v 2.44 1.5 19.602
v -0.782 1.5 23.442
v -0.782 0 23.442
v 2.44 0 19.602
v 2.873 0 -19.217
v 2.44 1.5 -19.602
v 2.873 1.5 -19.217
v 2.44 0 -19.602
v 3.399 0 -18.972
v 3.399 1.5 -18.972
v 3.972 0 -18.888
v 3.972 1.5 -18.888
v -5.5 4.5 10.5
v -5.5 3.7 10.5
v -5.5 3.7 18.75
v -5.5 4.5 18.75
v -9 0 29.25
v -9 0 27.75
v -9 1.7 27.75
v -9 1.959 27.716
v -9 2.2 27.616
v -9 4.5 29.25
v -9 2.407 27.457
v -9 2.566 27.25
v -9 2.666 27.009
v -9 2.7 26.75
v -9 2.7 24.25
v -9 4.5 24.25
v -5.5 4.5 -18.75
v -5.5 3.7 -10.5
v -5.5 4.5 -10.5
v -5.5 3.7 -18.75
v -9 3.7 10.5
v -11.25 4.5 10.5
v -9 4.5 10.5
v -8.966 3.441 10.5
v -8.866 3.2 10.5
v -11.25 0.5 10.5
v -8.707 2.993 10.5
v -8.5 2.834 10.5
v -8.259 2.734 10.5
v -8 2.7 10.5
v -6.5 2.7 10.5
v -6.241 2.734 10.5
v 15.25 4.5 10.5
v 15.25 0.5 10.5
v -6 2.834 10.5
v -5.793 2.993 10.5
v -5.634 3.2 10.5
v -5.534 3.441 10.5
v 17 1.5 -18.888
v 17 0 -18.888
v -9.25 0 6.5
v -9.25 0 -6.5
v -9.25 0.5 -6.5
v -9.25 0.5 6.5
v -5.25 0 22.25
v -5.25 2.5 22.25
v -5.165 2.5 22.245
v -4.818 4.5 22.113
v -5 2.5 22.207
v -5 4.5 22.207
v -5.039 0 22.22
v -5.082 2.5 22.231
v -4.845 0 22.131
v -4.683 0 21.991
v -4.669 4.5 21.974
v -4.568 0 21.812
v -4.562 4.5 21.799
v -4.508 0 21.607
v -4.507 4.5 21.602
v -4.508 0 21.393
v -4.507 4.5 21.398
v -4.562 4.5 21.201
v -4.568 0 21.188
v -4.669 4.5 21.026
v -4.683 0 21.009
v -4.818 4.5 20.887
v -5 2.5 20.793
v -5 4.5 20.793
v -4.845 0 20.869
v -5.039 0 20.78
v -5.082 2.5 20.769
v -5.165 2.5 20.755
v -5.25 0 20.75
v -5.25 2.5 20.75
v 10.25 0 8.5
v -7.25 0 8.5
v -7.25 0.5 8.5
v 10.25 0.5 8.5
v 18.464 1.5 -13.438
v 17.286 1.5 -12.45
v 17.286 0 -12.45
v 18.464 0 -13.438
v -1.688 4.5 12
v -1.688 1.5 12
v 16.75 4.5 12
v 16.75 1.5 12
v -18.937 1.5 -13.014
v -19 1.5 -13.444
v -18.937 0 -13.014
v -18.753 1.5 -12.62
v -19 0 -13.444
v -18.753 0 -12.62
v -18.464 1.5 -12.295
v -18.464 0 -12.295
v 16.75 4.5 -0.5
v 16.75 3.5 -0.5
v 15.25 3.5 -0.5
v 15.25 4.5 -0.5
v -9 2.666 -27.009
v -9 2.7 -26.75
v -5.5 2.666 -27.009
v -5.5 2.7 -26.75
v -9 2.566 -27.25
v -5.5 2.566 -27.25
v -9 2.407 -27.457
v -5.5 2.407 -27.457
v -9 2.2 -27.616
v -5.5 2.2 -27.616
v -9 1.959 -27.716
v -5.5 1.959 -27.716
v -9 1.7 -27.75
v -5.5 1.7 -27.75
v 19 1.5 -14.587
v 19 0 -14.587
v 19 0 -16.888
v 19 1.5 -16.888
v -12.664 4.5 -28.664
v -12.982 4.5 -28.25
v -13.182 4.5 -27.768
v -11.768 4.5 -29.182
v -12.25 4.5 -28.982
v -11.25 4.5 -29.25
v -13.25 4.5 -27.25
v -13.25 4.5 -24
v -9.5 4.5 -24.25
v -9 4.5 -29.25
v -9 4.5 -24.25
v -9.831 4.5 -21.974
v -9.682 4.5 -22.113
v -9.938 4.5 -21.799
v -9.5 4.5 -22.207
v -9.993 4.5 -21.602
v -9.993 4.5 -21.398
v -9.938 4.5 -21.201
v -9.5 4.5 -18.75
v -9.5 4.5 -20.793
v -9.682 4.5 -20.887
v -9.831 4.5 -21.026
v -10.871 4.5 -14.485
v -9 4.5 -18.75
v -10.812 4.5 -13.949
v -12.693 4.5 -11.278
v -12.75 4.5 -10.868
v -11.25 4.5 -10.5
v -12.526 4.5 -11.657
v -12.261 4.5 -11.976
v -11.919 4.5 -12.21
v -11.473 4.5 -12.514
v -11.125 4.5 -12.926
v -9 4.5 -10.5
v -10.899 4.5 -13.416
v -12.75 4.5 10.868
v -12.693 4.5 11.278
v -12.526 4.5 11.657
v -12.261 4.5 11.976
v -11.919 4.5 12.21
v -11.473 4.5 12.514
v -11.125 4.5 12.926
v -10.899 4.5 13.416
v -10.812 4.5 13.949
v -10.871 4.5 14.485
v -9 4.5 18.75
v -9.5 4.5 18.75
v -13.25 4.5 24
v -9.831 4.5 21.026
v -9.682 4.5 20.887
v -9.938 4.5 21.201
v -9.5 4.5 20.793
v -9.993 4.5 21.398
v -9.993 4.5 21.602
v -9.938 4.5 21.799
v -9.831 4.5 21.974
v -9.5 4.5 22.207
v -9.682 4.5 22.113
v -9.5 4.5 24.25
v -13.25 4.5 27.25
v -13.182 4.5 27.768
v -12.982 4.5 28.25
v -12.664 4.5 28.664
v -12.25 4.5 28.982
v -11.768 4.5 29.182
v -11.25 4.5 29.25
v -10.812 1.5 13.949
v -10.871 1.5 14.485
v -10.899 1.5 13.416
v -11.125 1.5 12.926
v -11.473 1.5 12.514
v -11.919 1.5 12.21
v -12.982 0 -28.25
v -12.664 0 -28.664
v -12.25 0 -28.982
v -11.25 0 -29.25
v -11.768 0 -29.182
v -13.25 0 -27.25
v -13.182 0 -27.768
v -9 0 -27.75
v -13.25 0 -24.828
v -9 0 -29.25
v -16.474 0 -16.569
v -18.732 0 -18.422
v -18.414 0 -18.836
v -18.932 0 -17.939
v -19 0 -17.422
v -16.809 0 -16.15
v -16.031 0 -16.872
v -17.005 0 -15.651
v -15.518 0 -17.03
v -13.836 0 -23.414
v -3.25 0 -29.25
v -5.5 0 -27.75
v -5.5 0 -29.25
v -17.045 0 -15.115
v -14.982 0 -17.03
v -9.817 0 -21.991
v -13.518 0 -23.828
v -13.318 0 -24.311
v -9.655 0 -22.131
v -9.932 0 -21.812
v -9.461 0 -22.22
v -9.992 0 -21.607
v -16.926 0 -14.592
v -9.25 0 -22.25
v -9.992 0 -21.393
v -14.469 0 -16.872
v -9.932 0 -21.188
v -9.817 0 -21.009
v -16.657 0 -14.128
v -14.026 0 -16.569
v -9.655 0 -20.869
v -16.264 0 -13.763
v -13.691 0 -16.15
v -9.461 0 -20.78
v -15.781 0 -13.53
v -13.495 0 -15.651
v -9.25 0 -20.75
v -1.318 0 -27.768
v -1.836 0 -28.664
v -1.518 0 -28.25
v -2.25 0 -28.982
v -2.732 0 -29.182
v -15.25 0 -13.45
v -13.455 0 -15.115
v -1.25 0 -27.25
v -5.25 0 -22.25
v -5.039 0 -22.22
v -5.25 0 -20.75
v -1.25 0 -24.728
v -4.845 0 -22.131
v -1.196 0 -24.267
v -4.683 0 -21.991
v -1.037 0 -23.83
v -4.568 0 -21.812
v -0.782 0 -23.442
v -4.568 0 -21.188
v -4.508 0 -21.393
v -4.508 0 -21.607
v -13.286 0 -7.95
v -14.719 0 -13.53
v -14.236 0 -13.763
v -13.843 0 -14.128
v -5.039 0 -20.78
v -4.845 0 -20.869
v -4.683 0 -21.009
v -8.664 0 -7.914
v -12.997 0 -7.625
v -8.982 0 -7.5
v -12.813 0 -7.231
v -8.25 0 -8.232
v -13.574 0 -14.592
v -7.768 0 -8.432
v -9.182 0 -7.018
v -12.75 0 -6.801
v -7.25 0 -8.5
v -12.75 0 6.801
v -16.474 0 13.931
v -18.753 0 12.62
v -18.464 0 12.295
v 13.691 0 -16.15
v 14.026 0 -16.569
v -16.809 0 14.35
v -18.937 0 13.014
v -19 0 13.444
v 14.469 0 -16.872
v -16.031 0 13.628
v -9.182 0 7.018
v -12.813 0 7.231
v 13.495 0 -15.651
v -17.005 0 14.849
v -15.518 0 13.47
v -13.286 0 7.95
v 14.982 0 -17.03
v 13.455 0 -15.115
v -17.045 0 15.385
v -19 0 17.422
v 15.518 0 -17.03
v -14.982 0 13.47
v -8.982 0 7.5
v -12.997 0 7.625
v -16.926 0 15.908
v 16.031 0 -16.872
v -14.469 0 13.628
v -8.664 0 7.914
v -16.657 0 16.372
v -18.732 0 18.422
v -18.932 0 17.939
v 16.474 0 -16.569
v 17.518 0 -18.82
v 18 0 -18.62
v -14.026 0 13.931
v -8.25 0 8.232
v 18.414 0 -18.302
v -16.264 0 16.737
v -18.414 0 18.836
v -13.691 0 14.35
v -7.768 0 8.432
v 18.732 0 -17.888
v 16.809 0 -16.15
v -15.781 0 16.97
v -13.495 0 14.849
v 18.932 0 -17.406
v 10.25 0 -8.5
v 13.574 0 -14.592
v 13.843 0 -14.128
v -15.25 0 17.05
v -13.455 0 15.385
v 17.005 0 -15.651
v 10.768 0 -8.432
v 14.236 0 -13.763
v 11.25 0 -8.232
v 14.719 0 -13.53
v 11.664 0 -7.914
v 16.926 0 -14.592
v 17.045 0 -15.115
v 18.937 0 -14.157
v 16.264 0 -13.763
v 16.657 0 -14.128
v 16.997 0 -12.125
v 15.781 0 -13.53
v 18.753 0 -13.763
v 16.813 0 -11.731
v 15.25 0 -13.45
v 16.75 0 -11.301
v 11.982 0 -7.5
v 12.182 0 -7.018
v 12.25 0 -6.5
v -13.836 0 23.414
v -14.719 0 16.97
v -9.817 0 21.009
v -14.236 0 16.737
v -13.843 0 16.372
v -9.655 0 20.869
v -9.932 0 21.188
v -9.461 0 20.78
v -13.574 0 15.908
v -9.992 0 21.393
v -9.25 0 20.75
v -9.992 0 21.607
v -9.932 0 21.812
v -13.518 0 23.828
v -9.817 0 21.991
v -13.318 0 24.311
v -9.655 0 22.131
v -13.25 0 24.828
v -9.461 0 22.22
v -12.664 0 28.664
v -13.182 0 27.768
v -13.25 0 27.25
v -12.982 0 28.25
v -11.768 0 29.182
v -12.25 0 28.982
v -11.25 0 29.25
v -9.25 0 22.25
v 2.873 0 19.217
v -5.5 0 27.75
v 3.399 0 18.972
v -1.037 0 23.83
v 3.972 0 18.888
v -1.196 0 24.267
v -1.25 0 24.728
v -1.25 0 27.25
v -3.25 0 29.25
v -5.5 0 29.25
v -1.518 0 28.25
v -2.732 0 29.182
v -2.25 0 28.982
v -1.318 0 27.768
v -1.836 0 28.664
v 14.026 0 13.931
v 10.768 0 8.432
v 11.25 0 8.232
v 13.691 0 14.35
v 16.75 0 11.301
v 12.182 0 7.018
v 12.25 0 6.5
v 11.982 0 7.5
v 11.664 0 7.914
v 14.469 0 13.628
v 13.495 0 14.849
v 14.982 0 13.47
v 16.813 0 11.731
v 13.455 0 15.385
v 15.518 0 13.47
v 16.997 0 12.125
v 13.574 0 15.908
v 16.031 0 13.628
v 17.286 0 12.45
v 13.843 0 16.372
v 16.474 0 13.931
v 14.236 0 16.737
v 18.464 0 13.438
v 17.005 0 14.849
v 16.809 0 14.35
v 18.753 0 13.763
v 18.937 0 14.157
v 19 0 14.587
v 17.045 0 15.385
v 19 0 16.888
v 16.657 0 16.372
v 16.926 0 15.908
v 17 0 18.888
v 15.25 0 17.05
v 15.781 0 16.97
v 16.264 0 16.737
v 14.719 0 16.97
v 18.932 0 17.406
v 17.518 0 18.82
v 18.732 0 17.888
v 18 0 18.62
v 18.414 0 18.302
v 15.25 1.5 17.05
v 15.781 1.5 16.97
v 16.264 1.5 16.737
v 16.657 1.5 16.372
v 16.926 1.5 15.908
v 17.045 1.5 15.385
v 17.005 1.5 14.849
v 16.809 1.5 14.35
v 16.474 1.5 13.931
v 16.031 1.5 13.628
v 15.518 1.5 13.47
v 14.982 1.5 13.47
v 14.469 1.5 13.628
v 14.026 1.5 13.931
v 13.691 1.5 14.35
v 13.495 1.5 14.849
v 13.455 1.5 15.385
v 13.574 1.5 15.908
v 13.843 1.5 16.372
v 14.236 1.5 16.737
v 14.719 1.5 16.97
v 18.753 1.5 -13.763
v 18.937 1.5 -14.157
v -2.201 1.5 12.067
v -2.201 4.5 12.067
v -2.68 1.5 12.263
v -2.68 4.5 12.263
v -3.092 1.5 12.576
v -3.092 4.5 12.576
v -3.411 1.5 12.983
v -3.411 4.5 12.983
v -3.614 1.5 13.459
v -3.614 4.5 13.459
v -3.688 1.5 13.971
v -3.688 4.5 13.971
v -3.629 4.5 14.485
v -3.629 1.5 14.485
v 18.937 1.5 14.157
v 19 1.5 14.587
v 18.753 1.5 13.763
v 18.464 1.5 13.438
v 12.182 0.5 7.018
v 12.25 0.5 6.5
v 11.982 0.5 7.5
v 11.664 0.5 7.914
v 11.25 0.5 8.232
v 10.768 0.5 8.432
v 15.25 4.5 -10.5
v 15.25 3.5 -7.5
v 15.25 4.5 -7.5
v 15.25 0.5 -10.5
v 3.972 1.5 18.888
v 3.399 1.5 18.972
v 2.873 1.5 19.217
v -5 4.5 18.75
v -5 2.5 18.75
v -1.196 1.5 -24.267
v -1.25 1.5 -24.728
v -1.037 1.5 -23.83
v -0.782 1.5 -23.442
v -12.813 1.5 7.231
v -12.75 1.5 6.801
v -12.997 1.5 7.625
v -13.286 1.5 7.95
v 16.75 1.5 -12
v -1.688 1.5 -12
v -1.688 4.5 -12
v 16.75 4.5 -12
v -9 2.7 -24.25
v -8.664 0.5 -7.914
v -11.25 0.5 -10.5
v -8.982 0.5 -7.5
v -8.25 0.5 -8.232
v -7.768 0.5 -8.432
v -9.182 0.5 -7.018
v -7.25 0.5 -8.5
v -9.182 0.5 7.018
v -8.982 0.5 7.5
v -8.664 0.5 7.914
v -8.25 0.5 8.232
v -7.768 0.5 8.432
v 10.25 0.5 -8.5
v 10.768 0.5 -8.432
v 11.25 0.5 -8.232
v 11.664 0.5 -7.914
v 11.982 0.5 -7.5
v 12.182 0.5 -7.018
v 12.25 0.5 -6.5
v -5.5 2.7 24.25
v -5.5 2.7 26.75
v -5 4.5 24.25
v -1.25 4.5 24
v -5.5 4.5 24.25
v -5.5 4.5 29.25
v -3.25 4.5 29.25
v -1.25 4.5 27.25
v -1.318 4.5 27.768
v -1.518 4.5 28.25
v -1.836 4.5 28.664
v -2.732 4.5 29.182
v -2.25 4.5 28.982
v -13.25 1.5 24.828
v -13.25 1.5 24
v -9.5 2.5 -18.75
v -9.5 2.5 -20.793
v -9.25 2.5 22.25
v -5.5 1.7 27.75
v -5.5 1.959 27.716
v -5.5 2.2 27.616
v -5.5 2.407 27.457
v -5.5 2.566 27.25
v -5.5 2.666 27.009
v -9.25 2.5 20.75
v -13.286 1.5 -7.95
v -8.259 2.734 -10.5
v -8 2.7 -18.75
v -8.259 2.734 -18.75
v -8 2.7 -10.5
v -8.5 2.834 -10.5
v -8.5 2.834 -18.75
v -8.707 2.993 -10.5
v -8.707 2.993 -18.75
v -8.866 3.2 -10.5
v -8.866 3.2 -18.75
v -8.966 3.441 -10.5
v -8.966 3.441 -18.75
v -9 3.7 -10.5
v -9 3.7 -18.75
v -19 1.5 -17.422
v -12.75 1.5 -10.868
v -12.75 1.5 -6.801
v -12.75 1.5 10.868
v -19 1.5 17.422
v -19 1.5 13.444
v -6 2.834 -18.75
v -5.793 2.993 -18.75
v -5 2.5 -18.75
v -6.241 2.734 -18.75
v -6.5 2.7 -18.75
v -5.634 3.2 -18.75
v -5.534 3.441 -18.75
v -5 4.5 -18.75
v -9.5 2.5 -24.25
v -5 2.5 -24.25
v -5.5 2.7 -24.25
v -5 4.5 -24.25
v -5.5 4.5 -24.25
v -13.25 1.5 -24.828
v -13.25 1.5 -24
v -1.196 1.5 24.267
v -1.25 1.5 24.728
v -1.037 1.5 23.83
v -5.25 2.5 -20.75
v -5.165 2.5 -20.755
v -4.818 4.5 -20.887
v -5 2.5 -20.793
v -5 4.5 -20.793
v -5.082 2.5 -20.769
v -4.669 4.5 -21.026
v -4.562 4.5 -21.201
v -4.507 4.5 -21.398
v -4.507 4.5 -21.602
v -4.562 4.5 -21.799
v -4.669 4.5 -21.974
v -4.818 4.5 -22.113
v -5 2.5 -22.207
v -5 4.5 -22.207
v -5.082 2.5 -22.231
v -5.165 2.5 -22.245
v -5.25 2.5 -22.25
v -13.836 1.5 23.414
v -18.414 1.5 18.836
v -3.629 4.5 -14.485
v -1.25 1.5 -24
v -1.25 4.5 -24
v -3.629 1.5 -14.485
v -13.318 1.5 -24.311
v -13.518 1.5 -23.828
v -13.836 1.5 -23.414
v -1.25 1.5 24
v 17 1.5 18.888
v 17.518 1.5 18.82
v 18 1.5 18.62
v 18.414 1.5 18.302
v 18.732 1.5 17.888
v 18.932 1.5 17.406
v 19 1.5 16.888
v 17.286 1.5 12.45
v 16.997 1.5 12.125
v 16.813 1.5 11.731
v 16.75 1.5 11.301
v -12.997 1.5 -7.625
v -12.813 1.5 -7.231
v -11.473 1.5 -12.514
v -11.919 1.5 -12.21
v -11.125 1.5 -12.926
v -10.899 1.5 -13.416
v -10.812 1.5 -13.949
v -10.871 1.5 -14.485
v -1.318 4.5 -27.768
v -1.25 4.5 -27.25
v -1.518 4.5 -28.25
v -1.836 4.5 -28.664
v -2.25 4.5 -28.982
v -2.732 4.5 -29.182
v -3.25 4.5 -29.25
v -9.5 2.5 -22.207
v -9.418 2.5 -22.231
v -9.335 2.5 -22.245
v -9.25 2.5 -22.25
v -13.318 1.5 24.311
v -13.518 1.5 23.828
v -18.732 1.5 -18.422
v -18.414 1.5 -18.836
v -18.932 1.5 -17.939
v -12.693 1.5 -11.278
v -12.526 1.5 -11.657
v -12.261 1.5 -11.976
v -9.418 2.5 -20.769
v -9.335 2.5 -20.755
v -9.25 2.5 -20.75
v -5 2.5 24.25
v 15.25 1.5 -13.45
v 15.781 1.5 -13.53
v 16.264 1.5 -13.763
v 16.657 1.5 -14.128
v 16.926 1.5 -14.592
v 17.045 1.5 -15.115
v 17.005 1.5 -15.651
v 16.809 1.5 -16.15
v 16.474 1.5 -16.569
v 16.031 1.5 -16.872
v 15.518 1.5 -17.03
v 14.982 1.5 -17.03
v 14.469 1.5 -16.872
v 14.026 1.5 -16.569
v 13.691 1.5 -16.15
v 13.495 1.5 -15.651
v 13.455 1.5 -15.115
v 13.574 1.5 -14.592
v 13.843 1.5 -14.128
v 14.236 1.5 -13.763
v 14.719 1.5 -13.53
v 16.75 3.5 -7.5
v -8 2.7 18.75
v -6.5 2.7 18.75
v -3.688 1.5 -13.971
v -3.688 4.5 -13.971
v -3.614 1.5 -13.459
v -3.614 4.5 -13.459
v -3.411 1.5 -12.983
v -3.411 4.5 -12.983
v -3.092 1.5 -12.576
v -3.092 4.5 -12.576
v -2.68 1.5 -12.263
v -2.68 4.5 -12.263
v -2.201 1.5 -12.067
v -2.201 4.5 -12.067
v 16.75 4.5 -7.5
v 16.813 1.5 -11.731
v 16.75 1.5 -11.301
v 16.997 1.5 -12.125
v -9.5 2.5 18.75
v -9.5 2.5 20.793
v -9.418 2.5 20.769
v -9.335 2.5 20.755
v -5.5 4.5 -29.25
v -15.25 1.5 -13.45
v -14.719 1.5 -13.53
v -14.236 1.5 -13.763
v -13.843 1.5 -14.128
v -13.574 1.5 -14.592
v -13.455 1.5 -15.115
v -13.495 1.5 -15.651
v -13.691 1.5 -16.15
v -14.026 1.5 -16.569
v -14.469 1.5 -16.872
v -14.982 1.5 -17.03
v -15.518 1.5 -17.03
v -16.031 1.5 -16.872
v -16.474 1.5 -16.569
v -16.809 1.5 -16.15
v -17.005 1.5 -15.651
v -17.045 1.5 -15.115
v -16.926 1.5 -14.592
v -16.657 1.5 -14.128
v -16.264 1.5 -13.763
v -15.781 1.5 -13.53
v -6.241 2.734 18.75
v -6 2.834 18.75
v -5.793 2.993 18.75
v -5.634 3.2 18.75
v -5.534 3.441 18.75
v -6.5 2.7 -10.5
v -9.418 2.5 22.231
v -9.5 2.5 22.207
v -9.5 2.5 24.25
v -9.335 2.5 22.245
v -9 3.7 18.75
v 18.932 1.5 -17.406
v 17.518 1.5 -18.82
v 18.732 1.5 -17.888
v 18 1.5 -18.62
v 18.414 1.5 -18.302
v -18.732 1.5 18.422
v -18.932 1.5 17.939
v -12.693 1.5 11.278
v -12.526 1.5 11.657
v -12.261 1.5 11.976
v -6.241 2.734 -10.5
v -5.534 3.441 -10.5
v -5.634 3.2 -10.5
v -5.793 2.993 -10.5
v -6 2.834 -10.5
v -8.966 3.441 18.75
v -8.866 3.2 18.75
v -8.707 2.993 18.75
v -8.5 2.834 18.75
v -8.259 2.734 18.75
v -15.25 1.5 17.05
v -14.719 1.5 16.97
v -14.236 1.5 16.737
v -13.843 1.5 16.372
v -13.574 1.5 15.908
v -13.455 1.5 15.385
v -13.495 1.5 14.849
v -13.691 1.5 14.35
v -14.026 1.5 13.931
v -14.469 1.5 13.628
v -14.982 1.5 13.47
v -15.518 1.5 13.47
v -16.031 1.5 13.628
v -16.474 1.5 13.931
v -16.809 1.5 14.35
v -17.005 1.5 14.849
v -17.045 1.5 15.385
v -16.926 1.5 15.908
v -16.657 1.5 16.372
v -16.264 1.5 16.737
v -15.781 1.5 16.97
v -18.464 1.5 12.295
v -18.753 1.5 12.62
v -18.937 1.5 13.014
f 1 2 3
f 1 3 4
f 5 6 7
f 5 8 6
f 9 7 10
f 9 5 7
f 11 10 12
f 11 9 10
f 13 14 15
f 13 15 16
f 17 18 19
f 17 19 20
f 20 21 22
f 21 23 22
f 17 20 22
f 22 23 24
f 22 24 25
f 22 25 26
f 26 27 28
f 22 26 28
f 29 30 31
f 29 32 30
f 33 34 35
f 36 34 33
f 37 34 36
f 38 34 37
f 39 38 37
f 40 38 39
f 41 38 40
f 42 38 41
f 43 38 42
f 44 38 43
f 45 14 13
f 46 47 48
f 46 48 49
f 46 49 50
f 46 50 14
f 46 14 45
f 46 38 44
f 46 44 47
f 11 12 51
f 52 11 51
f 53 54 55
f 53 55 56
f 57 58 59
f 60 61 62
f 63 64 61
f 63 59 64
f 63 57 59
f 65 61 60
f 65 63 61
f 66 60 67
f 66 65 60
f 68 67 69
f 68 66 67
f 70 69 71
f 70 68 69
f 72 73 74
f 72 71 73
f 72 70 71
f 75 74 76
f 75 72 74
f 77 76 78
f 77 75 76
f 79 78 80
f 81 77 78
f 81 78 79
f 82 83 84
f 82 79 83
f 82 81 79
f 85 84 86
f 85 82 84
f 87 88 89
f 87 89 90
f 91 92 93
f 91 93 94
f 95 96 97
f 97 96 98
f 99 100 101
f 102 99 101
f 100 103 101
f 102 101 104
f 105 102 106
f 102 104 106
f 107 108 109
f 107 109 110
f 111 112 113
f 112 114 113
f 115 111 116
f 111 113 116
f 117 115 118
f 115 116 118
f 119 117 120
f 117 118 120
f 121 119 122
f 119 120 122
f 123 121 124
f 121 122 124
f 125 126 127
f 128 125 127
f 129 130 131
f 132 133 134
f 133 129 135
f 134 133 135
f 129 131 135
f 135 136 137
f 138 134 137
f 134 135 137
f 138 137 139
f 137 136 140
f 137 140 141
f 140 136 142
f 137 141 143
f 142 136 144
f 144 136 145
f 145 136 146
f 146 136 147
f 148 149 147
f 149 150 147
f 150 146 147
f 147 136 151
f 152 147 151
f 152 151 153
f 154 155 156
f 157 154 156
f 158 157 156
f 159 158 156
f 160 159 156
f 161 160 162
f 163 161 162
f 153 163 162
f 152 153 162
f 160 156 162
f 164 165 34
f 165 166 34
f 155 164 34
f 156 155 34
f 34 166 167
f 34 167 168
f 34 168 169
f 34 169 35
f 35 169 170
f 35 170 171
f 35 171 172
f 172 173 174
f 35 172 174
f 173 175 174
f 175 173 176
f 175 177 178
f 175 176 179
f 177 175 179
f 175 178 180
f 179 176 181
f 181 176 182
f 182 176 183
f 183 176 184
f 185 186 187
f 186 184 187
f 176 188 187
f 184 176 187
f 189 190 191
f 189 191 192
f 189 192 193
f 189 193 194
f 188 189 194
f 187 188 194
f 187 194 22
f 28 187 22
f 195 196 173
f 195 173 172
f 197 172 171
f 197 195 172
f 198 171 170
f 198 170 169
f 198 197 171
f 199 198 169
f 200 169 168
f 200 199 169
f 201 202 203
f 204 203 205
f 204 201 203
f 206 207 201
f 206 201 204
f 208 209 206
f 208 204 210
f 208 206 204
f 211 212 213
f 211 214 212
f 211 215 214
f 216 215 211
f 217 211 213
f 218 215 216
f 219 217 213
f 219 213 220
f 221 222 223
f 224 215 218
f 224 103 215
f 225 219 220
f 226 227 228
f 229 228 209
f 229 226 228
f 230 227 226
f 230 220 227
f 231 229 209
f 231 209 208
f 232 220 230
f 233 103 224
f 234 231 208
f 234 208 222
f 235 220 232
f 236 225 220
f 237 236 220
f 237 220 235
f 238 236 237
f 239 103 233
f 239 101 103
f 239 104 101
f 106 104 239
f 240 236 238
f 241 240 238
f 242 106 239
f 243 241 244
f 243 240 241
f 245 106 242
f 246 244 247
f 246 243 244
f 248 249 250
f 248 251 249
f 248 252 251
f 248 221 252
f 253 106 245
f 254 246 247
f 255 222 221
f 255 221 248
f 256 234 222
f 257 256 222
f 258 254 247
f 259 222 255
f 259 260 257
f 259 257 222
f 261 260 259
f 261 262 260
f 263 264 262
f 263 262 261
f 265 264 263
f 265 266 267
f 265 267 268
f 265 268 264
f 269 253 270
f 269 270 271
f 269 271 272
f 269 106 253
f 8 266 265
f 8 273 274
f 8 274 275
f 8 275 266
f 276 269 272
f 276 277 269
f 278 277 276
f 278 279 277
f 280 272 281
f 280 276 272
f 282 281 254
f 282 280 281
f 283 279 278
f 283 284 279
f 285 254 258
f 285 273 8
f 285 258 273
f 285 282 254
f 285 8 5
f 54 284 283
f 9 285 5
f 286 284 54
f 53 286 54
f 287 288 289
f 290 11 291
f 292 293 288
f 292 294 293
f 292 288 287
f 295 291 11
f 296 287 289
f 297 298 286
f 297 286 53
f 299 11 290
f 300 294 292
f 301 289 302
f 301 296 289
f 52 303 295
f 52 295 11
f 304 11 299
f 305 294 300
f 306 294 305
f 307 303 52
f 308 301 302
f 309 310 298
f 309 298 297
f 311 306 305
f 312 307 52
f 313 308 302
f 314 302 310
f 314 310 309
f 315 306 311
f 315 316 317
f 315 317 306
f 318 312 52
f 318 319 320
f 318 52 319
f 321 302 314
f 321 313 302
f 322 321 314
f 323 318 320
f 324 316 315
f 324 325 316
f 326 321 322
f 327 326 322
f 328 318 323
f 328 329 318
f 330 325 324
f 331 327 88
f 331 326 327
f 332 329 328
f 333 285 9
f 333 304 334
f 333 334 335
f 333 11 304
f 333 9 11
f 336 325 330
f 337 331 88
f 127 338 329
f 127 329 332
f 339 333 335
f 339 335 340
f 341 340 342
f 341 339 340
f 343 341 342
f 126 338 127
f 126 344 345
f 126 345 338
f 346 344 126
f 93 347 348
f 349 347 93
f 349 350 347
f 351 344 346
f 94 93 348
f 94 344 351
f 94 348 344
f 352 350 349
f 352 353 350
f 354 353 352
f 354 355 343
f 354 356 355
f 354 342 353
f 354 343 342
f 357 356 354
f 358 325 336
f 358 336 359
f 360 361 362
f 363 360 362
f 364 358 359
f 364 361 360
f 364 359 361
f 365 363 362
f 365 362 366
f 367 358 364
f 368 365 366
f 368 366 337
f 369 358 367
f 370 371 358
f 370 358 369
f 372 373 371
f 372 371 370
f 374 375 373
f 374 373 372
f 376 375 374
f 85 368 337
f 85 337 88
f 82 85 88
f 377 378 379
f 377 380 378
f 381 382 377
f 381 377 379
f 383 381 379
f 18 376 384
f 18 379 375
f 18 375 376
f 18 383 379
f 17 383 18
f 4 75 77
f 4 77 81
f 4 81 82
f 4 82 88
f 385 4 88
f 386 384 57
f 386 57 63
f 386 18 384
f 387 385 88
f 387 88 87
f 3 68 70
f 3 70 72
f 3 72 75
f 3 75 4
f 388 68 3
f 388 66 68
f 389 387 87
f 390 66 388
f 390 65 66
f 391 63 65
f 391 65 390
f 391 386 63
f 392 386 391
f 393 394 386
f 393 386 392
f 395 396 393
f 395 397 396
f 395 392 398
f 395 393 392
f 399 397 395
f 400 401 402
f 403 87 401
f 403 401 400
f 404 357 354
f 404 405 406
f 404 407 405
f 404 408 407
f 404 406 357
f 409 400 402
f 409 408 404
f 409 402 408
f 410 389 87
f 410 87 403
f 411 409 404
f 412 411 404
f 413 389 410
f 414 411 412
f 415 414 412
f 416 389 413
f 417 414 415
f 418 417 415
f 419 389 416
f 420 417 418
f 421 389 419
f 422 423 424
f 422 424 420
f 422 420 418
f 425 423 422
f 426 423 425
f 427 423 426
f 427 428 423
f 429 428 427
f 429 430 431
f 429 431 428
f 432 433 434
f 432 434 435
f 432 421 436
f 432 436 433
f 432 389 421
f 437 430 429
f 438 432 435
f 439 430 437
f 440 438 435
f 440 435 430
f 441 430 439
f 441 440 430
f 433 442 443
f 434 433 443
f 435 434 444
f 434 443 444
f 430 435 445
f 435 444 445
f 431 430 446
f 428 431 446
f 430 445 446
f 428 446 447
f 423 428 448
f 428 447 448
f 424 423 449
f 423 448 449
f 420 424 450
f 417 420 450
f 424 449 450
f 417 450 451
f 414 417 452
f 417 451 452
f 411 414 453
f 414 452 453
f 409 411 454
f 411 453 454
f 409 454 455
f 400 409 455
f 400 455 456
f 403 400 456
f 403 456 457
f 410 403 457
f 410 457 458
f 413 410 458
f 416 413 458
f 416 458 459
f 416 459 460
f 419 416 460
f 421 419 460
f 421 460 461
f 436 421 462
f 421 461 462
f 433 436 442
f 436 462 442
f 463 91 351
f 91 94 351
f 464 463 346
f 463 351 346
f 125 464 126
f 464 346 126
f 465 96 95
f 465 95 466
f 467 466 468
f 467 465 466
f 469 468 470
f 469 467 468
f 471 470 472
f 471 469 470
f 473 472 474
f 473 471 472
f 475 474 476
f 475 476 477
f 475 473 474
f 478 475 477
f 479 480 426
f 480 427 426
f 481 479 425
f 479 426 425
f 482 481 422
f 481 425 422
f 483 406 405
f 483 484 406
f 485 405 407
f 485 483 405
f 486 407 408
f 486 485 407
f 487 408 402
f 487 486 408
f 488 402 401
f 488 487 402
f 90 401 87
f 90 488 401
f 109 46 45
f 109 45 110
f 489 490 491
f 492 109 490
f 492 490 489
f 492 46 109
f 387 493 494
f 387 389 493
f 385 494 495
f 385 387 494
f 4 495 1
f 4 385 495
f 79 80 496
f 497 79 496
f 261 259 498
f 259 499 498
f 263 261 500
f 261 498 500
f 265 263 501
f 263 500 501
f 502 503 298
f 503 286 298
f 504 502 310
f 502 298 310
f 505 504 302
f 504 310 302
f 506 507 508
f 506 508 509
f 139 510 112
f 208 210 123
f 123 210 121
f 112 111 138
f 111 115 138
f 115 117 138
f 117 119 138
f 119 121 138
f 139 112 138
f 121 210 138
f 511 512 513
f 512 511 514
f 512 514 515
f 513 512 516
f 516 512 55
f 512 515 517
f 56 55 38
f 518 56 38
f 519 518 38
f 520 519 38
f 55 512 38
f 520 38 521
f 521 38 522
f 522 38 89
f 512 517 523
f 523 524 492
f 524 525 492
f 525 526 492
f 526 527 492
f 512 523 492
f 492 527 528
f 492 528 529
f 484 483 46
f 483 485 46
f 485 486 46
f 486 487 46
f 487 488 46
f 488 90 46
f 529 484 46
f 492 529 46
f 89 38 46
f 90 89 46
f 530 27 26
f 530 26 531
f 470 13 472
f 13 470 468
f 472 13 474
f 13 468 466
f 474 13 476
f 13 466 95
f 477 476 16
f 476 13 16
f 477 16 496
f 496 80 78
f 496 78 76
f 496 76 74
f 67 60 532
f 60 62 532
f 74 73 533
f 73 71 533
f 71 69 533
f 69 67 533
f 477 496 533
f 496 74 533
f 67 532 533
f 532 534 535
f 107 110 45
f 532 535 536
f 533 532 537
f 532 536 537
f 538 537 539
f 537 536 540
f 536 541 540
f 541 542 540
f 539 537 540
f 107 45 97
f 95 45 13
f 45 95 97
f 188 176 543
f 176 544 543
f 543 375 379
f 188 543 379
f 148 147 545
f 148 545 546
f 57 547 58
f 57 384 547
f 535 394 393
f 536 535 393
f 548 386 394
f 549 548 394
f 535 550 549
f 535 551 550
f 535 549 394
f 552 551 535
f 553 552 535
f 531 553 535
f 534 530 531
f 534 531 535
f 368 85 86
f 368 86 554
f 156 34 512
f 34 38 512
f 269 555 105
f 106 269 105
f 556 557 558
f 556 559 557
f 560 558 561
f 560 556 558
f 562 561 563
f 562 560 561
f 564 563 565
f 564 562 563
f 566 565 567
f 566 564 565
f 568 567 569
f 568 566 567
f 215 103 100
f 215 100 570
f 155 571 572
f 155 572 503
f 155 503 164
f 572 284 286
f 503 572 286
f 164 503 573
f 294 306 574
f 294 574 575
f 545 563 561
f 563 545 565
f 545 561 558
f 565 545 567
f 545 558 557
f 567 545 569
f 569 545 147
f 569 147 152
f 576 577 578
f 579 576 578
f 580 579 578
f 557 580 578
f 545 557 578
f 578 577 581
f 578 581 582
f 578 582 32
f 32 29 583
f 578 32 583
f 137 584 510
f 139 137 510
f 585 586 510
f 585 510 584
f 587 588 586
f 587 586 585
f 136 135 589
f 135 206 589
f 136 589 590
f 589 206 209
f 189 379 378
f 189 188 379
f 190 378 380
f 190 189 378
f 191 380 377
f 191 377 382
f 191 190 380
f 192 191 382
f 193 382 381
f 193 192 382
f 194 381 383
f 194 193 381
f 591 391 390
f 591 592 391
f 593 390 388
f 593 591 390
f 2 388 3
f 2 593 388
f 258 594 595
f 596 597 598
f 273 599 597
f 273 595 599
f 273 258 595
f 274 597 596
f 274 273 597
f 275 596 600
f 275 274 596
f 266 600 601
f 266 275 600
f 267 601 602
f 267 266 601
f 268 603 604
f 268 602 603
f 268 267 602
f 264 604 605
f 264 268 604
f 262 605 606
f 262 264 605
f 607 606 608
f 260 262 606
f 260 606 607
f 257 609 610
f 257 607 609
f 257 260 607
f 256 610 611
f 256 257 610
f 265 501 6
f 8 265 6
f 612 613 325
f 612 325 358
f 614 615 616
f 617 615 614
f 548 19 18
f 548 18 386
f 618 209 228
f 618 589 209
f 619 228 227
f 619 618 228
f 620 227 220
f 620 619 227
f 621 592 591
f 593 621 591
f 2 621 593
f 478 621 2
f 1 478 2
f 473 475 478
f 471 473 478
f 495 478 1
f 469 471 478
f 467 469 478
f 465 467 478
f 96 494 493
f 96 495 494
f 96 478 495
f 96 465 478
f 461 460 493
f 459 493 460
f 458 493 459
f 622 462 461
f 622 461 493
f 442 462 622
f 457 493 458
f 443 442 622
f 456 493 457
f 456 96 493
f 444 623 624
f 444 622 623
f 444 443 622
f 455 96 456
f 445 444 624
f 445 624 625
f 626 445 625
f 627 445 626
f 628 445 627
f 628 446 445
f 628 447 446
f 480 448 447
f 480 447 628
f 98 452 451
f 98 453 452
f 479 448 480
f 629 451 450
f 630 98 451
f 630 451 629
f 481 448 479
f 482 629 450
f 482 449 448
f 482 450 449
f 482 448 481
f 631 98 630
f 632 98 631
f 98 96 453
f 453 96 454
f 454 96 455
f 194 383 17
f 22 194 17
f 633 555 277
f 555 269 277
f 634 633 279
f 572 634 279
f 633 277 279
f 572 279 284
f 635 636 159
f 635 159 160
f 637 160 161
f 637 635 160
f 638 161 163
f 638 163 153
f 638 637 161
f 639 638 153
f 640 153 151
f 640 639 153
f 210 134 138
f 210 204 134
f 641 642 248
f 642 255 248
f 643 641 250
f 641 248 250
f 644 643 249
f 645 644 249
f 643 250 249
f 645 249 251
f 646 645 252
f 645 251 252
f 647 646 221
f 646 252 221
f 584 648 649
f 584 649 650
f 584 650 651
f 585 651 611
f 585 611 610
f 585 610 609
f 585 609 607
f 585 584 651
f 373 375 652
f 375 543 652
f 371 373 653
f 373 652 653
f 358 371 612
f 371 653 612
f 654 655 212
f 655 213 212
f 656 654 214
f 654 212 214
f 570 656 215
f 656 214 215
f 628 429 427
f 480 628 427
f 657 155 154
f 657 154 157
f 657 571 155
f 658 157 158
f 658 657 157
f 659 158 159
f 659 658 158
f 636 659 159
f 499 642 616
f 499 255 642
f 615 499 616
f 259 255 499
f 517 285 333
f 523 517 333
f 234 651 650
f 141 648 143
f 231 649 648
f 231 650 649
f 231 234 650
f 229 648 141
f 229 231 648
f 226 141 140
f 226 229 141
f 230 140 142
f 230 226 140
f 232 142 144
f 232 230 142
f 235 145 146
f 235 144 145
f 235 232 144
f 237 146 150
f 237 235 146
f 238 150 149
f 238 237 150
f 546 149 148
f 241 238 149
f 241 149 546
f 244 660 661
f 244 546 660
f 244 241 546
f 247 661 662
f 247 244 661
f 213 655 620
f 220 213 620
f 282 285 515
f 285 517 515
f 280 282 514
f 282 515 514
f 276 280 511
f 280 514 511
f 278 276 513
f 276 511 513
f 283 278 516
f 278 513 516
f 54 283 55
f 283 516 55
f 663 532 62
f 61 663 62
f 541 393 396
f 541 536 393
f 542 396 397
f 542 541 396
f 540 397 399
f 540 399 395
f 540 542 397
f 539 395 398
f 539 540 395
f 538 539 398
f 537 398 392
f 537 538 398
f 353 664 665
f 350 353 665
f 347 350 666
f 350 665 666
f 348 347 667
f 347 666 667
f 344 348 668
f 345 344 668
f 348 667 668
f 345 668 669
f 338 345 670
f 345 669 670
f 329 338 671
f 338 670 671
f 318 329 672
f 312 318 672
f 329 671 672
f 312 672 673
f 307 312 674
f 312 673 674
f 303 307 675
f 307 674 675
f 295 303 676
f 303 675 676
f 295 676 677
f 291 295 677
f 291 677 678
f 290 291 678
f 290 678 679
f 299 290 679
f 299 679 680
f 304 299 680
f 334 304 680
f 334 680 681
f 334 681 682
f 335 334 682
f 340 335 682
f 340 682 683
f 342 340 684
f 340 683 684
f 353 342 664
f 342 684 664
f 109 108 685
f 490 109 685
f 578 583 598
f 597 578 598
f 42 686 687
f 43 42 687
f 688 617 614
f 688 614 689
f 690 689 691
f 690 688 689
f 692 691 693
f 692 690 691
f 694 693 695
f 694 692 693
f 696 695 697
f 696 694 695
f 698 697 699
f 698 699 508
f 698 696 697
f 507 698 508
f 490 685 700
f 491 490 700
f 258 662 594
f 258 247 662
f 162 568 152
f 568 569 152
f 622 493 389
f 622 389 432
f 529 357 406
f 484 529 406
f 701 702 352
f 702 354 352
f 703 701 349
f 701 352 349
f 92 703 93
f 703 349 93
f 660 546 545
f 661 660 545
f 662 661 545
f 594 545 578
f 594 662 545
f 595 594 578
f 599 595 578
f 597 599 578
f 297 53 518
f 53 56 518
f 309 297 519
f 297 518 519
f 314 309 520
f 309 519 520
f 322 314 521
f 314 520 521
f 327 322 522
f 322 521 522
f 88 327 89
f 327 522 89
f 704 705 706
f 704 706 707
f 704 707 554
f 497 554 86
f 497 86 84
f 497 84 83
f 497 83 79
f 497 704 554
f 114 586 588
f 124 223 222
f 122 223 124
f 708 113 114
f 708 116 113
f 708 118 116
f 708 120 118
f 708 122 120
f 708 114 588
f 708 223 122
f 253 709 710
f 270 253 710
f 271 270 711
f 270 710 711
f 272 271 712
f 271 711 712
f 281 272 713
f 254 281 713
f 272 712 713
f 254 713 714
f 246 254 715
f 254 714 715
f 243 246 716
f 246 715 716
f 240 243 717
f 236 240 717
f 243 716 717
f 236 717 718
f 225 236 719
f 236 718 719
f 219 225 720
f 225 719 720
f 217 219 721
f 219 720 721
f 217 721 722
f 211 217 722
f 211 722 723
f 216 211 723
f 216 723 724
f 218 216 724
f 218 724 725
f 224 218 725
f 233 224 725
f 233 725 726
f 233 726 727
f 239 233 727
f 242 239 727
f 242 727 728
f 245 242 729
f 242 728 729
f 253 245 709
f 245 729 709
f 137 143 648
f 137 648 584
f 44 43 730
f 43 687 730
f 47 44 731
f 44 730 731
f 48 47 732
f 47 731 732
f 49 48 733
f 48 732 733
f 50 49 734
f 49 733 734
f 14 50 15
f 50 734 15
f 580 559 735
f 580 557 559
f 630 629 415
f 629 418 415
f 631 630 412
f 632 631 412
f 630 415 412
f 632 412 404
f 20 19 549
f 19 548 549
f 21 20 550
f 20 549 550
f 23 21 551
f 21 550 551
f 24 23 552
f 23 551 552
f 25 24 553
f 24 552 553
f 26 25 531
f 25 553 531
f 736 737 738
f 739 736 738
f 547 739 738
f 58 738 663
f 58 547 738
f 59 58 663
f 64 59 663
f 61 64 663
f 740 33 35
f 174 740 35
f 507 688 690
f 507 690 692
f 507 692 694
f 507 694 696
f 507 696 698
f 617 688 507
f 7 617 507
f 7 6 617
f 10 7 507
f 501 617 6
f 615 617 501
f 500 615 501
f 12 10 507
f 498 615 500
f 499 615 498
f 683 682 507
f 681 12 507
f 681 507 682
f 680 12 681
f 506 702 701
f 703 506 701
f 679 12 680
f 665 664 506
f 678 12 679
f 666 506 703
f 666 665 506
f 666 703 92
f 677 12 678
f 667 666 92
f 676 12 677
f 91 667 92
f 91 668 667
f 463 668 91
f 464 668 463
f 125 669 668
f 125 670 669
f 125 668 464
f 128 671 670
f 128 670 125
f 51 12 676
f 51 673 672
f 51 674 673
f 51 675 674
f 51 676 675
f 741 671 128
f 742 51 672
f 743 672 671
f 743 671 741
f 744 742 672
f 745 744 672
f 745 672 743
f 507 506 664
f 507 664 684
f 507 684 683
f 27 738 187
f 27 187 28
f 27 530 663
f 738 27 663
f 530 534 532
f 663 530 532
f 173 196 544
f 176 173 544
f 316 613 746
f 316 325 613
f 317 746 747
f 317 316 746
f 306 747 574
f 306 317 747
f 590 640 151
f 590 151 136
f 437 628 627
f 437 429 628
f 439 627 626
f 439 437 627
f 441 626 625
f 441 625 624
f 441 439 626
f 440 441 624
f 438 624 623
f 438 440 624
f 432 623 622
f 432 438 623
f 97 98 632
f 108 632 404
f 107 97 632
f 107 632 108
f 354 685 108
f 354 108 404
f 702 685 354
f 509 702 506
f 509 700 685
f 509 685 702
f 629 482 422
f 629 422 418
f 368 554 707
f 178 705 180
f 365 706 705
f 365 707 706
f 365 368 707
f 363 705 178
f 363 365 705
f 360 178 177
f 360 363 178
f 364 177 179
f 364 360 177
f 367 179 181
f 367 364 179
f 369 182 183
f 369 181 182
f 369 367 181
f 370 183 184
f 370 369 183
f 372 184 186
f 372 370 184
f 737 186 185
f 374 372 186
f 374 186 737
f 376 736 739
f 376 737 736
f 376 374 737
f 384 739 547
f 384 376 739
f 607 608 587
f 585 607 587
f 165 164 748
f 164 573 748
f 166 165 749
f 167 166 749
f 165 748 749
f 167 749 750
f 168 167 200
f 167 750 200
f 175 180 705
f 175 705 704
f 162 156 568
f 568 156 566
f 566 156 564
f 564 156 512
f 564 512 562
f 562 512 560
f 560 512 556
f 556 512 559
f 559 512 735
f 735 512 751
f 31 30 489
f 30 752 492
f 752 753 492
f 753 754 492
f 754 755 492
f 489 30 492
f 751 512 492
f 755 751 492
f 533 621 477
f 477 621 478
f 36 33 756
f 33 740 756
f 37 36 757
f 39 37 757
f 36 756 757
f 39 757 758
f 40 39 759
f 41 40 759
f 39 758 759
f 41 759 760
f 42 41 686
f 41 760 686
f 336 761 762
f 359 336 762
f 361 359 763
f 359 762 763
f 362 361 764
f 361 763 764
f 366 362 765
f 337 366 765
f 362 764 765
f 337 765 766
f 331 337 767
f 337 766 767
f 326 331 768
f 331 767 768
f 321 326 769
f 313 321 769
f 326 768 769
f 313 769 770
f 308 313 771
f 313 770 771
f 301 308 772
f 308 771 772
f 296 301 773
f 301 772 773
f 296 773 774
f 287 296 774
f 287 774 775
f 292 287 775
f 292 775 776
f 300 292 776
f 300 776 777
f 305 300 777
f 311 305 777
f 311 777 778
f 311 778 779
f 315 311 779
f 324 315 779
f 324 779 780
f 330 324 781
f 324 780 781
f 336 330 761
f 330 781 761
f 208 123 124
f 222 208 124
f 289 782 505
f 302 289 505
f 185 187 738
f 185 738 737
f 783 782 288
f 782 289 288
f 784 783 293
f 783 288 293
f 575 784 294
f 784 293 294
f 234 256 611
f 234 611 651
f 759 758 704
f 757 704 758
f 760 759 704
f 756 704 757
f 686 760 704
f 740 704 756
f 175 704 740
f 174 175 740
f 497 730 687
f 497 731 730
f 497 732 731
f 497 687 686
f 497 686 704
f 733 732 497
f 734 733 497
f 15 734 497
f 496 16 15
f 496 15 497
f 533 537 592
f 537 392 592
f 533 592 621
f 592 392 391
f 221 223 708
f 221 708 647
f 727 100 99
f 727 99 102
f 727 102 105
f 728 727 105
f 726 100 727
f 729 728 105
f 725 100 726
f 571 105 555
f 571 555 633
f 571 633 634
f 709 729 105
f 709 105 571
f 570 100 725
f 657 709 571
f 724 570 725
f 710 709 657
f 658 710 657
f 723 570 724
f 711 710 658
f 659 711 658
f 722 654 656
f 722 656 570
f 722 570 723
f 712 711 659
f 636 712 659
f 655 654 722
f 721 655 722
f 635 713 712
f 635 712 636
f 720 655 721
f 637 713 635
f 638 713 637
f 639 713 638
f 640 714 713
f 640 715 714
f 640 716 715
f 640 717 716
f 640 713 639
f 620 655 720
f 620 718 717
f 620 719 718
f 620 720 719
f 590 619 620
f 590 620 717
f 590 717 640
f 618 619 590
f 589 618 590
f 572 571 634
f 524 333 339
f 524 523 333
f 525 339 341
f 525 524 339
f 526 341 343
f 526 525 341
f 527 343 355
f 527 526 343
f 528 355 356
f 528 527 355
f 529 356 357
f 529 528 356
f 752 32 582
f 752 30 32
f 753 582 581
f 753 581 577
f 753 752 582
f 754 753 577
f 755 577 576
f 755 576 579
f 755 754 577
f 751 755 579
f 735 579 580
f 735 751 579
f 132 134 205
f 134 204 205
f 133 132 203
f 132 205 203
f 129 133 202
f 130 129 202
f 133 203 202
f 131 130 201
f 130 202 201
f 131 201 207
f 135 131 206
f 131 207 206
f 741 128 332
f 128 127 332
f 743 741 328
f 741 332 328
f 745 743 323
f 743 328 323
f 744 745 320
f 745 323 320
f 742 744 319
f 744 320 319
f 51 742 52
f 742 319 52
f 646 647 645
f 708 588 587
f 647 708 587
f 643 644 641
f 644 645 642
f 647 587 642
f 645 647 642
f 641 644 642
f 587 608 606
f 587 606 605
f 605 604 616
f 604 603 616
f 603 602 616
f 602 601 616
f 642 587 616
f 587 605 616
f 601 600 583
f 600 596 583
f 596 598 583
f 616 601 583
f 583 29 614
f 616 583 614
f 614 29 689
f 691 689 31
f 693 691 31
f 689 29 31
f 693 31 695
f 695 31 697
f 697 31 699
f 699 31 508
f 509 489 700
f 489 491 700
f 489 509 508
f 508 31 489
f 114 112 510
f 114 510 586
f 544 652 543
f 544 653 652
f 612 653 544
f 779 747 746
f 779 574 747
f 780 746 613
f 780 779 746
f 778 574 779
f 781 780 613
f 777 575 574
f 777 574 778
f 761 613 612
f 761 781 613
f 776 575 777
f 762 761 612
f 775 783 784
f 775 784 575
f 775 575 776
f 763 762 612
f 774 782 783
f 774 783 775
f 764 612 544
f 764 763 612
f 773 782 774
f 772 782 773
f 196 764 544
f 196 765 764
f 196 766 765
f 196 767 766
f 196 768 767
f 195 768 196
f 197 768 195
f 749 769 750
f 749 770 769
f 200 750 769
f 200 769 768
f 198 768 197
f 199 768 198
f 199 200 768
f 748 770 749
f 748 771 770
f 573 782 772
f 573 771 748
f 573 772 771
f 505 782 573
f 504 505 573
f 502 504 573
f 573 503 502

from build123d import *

# Parameters (mm, degrees)
SKIZZE1_W                                     = 38
SKIZZE1_H                                     = 48
GRUNDPLATTE_DEPTH                             = 1.5
SKIZZE2_R                                     = 1.8
FC_BOHRUNGEN_DEPTH                            = 1.5
SKIZZE3_W                                     = 26.5
SKIZZE3_H                                     = 21
AUSCHNITT_EMPF_NGER_DEPTH                     = 31.647185841
SKIZZE4_W                                     = 26.5
SKIZZE4_H                                     = 21
SKIZZE4_W_2                                   = 21.5
SKIZZE4_H_2                                   = 17
AUFLAGEEMPF_NGER_DEPTH                        = 0.5
VERRUNDUNG1_R                                 = 2
LANGLOCHKABELBINDER_DEPTH                     = 31.647185841
SKIZZE8_W                                     = 12
SKIZZE8_H                                     = 5.25
AUFSATZ_LINEAR_AUSTRAGEN7_DEPTH               = 1.5
SKIZZE10_W                                    = 29.5
SKIZZE10_H                                    = 24
SKIZZE10_W_2                                  = 26.5
SKIZZE10_H_2                                  = 21
HALTERAHMEN_EMPF_NGER_DEPTH                   = 3
DURCHBRUCH_EMPF_NGER_REACH                    = 48.41
SKIZZE11_W                                    = 7
SKIZZE11_H                                    = 1
VERST_RKUNG_KABELBINDER_DEPTH                 = 3
VERRUNDUNG_VERST_RKUNG_KABELBINDER_R          = 2
AUSSCHNITT_ANTENNENANSATZEMPF_NGER_DEPTH      = 45.286707938
AUSSCHNITT_ANTENNENANSATZEMPF_NGER_DEPTH_BACK = 45.286707938
SKIZZE13_W                                    = 3.5
SKIZZE13_H                                    = 1.8
LANGLOCH_REPARATUR_DEPTH                      = 36.168345142
SKIZZE15_W                                    = 3.5
SKIZZE15_H                                    = 1.5
SCHNITT_LINEAR_AUSTRAGEN8_DEPTH               = 35.983603302
SKIZZE16_W                                    = 4.5
SKIZZE16_H                                    = 5.5
SCHNITT_LINEAR_AUSTRAGEN9_DEPTH               = 2
SCHNITT_LINEAR_AUSTRAGEN10_DEPTH              = 36.008034792
VERRUNDUNG6_R                                 = 1
VERRUNDUNG7_R                                 = 1.5
VERRUNDUNG8_R                                 = 1
VERRUNDUNG4_R                                 = 2
VERRUNDUNG5_R                                 = 1.5


with BuildPart() as part:
    # Skizze1 → Grundplatte (new body)
    with BuildSketch(Plane(origin=(0, 0, 0), x_dir=(1, 0, 0), z_dir=(0, 1, 0))):
        Rectangle(SKIZZE1_W, SKIZZE1_H)
    extrude(amount=GRUNDPLATTE_DEPTH)

    # Skizze2 → FC-Bohrungen (cut)
    with BuildSketch(Plane(origin=(0, 1.5, 0), x_dir=(1, 0, 0), z_dir=(0, 1, 0))):
        with Locations(Location((-15.25, 15.25, 0), (0, 0, 270))):
            Circle(SKIZZE2_R)
        with Locations(Location((15.25, 15.25, 0), (0, 0, 270))):
            Circle(SKIZZE2_R)
        with Locations(Location((15.25, -15.25, 0), (0, 0, 270))):
            Circle(SKIZZE2_R)
        with Locations(Location((-15.25, -15.25, 0), (0, 0, 270))):
            Circle(SKIZZE2_R)
    extrude(amount=-FC_BOHRUNGEN_DEPTH, mode=Mode.SUBTRACT)

    # Skizze3 → Auschnitt Empfänger (cut, through all)
    with BuildSketch(Plane(origin=(0, 1.5, 0), x_dir=(1, 0, 0), z_dir=(0, 1, 0))):
        with Locations((2, 0)):
            Rectangle(SKIZZE3_W, SKIZZE3_H)
    extrude(amount=-AUSCHNITT_EMPF_NGER_DEPTH, mode=Mode.SUBTRACT)

    # Skizze4 → AuflageEMpfänger (add)
    with BuildSketch(Plane.XZ):
        with Locations((2, 0)):
            Rectangle(SKIZZE4_W, SKIZZE4_H)
        with Locations((1.5, 0)):
            Rectangle(SKIZZE4_W_2, SKIZZE4_H_2, mode=Mode.SUBTRACT)
    extrude(amount=-AUFLAGEEMPF_NGER_DEPTH)

    # Verrundung1
    verrundung1_edges = [part.edges().sort_by_distance(p)[0] for p in [
        (-9.25, 0.25, 8.5),
        (12.25, 0.25, 8.5),
        (12.25, 0.25, -8.5),
        (-9.25, 0.25, -8.5),
    ]]
    fillet(verrundung1_edges, radius=VERRUNDUNG1_R)

    # Skizze7 → LanglochKabelbinder (cut, through all)
    with BuildSketch(Plane(origin=(0, 1.5, 0), x_dir=(1, 0, 0), z_dir=(0, 1, 0))):
        with BuildLine():
            Line((-9.25, 22.25), (-5.25, 22.25))
            ThreePointArc((-5.25, 22.25), (-4.5, 21.5), (-5.25, 20.75))
            Line((-5.25, 20.75), (-9.25, 20.75))
            ThreePointArc((-9.25, 20.75), (-10, 21.5), (-9.25, 22.25))
        make_face()
        with BuildLine():
            Line((-5.25, -22.25), (-9.25, -22.25))
            ThreePointArc((-9.25, -22.25), (-10, -21.5), (-9.25, -20.75))
            Line((-9.25, -20.75), (-5.25, -20.75))
            ThreePointArc((-5.25, -20.75), (-4.5, -21.5), (-5.25, -22.25))
        make_face()
    extrude(amount=-LANGLOCHKABELBINDER_DEPTH, mode=Mode.SUBTRACT)

    # Skizze8 → Aufsatz-Linear austragen7 (add, through all)
    with BuildSketch(Plane.XZ):
        with Locations((-7.25, 26.625)):
            Rectangle(SKIZZE8_W, SKIZZE8_H)
        with Locations((-7.25, -26.625)):
            Rectangle(SKIZZE8_W, SKIZZE8_H)
    extrude(amount=-AUFSATZ_LINEAR_AUSTRAGEN7_DEPTH)

    # Skizze10 → Halterahmen Empfänger (add)
    with BuildSketch(Plane(origin=(0, 1.5, 0), x_dir=(1, 0, 0), z_dir=(0, 1, 0))):
        with Locations((2, 0)):
            Rectangle(SKIZZE10_W, SKIZZE10_H)
        with Locations((2, 0)):
            Rectangle(SKIZZE10_W_2, SKIZZE10_H_2, mode=Mode.SUBTRACT)
    extrude(amount=HALTERAHMEN_EMPF_NGER_DEPTH)

    # Skizze11 → Durchbruch Empfänger (cut, up to next)
    with BuildSketch(Plane(origin=(16.75, 0, 0), x_dir=(0, 0, -1), z_dir=(1, 0, 0)), mode=Mode.PRIVATE) as durchbruch_empf_nger_sk1:
        with Locations((4, 4)):
            Rectangle(SKIZZE11_W, SKIZZE11_H)
    durchbruch_empf_nger_tool1 = extrude(durchbruch_empf_nger_sk1.sketch, amount=-DURCHBRUCH_EMPF_NGER_REACH, mode=Mode.PRIVATE) & part.part
    add(durchbruch_empf_nger_tool1.solids().sort_by_distance((16.75, 4, -4))[0], mode=Mode.SUBTRACT)

    # Skizze12 → Verstärkung Kabelbinder (add)
    with BuildSketch(Plane(origin=(0, 1.5, 0), x_dir=(1, 0, 0), z_dir=(0, 1, 0))):
        Polygon((-13.25, -24), (-13.25, -29.25), (-1.25, -29.25), (-1.25, -24), (-4.25, -12), (-10.25, -12), align=None)
        Polygon((-10.25, 12), (-13.25, 24), (-13.25, 29.25), (-1.25, 29.25), (-1.25, 24), (-4.25, 12), align=None)
    extrude(amount=VERST_RKUNG_KABELBINDER_DEPTH)

    # Verrundung Verstärkung Kabelbinder
    # the kernel refuses this fillet: 2 mm, written as the material it adds along each edge
    with BuildSketch(Plane(origin=(-4.25, 1.5, -12), x_dir=(0.2425356250363328, 0, -0.9701425001453319), z_dir=(0, 1, 0)), Plane(origin=(-4.25, 1.5, 12), x_dir=(1, 0, 0), z_dir=(0, 1, 0))) as verrundung_verst_rkung_kabelbinder_piece_1:
        with BuildLine():
            CenterArc((VERRUNDUNG_VERST_RKUNG_KABELBINDER_R * 1.2807764064, -VERRUNDUNG_VERST_RKUNG_KABELBINDER_R), VERRUNDUNG_VERST_RKUNG_KABELBINDER_R, 90, 104.036243468)
            Line((VERRUNDUNG_VERST_RKUNG_KABELBINDER_R * 0.310633906259, -VERRUNDUNG_VERST_RKUNG_KABELBINDER_R * 1.24253562504), (0, 0))
            Line((0, 0), (VERRUNDUNG_VERST_RKUNG_KABELBINDER_R * 1.2807764064, 0))
        make_face()
    extrude(amount=3)
    with BuildSketch(Plane(origin=(-10.25, 1.5, -12), x_dir=(-1, 0, 0), z_dir=(0, 1, 0))) as verrundung_verst_rkung_kabelbinder_piece_2_section:
        with BuildLine():
            CenterArc((VERRUNDUNG_VERST_RKUNG_KABELBINDER_R * 1.2807764064, -VERRUNDUNG_VERST_RKUNG_KABELBINDER_R), VERRUNDUNG_VERST_RKUNG_KABELBINDER_R, 90, 104.036243468)
            Line((VERRUNDUNG_VERST_RKUNG_KABELBINDER_R * 0.310633906259, -VERRUNDUNG_VERST_RKUNG_KABELBINDER_R * 1.24253562504), (0, 0))
            Line((0, 0), (VERRUNDUNG_VERST_RKUNG_KABELBINDER_R * 1.2807764064, 0))
        make_face()
    verrundung_verst_rkung_kabelbinder_piece_2 = extrude(amount=3, mode=Mode.PRIVATE)
    verrundung_verst_rkung_kabelbinder_piece_2 = split(verrundung_verst_rkung_kabelbinder_piece_2, bisect_by=Plane(origin=(-12.75, 3, -12.581943017), z_dir=(1, 0, 0)), keep=Keep.TOP, mode=Mode.PRIVATE)
    add(verrundung_verst_rkung_kabelbinder_piece_2)
    with BuildSketch(Plane(origin=(-10.25, 1.5, 12), x_dir=(-1, 0, 0), z_dir=(0, 1, 0))) as verrundung_verst_rkung_kabelbinder_piece_3_section:
        with BuildLine():
            CenterArc((VERRUNDUNG_VERST_RKUNG_KABELBINDER_R * 1.2807764064, VERRUNDUNG_VERST_RKUNG_KABELBINDER_R), VERRUNDUNG_VERST_RKUNG_KABELBINDER_R, 165.963756532, 104.036243468)
            Line((VERRUNDUNG_VERST_RKUNG_KABELBINDER_R * 0.310633906259, VERRUNDUNG_VERST_RKUNG_KABELBINDER_R * 1.24253562504), (0, 0))
            Line((0, 0), (VERRUNDUNG_VERST_RKUNG_KABELBINDER_R * 1.2807764064, 0))
        make_face()
    verrundung_verst_rkung_kabelbinder_piece_3 = extrude(amount=3, mode=Mode.PRIVATE)
    verrundung_verst_rkung_kabelbinder_piece_3 = split(verrundung_verst_rkung_kabelbinder_piece_3, bisect_by=Plane(origin=(-12.75, 3, 12.581943017), z_dir=(1, 0, 0)), keep=Keep.TOP, mode=Mode.PRIVATE)
    add(verrundung_verst_rkung_kabelbinder_piece_3)

    # Skizze13 → Ausschnitt AntennenAnsatzEmpfänger (cut, two sides: drawn at the far end of the back side and taken through both)
    with BuildSketch(Plane.XY.offset(-10.5).offset(-AUSSCHNITT_ANTENNENANSATZEMPF_NGER_DEPTH_BACK)):
        with Locations((-7.25, 3.6)):
            Rectangle(SKIZZE13_W, SKIZZE13_H)
    extrude(amount=AUSSCHNITT_ANTENNENANSATZEMPF_NGER_DEPTH + AUSSCHNITT_ANTENNENANSATZEMPF_NGER_DEPTH_BACK, mode=Mode.SUBTRACT)

    # Skizze14 → Langloch Reparatur (cut, through all)
    with BuildSketch(Plane.XZ):
        with BuildLine():
            Line((-5.25, 20.75), (-9.25, 20.75))
            ThreePointArc((-9.25, 20.75), (-10, 21.5), (-9.25, 22.25))
            Line((-9.25, 22.25), (-5.25, 22.25))
            ThreePointArc((-5.25, 22.25), (-4.5, 21.5), (-5.25, 20.75))
        make_face()
        with BuildLine():
            Line((-5.25, -22.25), (-9.25, -22.25))
            ThreePointArc((-9.25, -22.25), (-10, -21.5), (-9.25, -20.75))
            Line((-9.25, -20.75), (-5.25, -20.75))
            ThreePointArc((-5.25, -20.75), (-4.5, -21.5), (-5.25, -22.25))
        make_face()
    extrude(amount=-LANGLOCH_REPARATUR_DEPTH, mode=Mode.SUBTRACT)

    # Skizze15 → Schnitt-Linear austragen8 (cut, through all)
    with BuildSketch(Plane(origin=(0, 2.7, 0), x_dir=(1, 0, 0), z_dir=(0, 1, 0))):
        with Locations((-7.25, 28.5)):
            Rectangle(SKIZZE15_W, SKIZZE15_H)
        with Locations((-7.25, -28.5)):
            Rectangle(SKIZZE15_W, SKIZZE15_H)
    extrude(amount=-SCHNITT_LINEAR_AUSTRAGEN8_DEPTH, mode=Mode.SUBTRACT)

    # Skizze16 → Schnitt-Linear austragen9 (cut)
    with BuildSketch(Plane(origin=(0, 4.5, 0), x_dir=(1, 0, 0), z_dir=(0, 1, 0))):
        with Locations((-7.25, 21.5)):
            Rectangle(SKIZZE16_W, SKIZZE16_H)
        with Locations((-7.25, -21.5)):
            Rectangle(SKIZZE16_W, SKIZZE16_H)
    extrude(amount=-SCHNITT_LINEAR_AUSTRAGEN9_DEPTH, mode=Mode.SUBTRACT)

    # Skizze17 → Schnitt-Linear austragen10 (cut, through all)
    with BuildSketch(Plane(origin=(0, 1.5, 0), x_dir=(1, 0, 0), z_dir=(0, 1, 0))):
        Polygon((16.75, 12), (19, 13.88797417), (19, -13.88797417), (16.75, -12), align=None)
        Polygon((-12.75, 7.5), (-19, 12.744372695), (-19, -12.744372695), (-12.75, -7.5), align=None)
        Polygon((-19, 18.25), (-13.25, 24), (-19, 24), align=None)
        Polygon((-1.25, 24), (3.039498988, 18.88797417), (19, 18.88797417), (19, 24), align=None)
        Polygon((-19, -24), (-19, -18.25), (-13.25, -24), align=None)
        Polygon((19, -24), (-1.25, -24), (3.039498988, -18.88797417), (19, -18.88797417), align=None)
    extrude(amount=-SCHNITT_LINEAR_AUSTRAGEN10_DEPTH, mode=Mode.SUBTRACT)

    # Verrundung6
    verrundung6_edges = [part.edges().sort_by_distance(p)[0] for p in [
        (-7.25, 2.7, -27.75),
        (-7.25, 2.7, 27.75),
    ]]
    fillet(verrundung6_edges, radius=VERRUNDUNG6_R)

    # Verrundung7
    verrundung7_edges = [part.edges().sort_by_distance(p)[0] for p in [
        (16.75, 0.75, 12),
        (16.75, 0.75, -12),
        (19, 0.75, -13.88797417),
        (19, 0.75, 13.88797417),
        (-12.75, 0.75, -7.5),
        (-12.75, 0.75, 7.5),
        (-19, 0.75, 12.744372695),
        (-19, 0.75, -12.744372695),
    ]]
    fillet(verrundung7_edges, radius=VERRUNDUNG7_R)

    # Verrundung8
    verrundung8_edges = [part.edges().sort_by_distance(p)[0] for p in [
        (-5.5, 2.7, 14.625),
        (-9, 2.7, 14.625),
        (-5.5, 2.7, -14.625),
        (-9, 2.7, -14.625),
    ]]
    fillet(verrundung8_edges, radius=VERRUNDUNG8_R)

    # Verrundung4
    verrundung4_edges = [part.edges().sort_by_distance(p)[0] for p in [
        (-13.25, 2.25, 29.25),
        (-1.25, 2.25, 29.25),
        (-1.25, 2.25, -29.25),
        (-13.25, 2.25, -29.25),
        (-13.25, 0.75, -24),
        (-19, 0.75, -18.25),
        (-1.25, 0.75, -24),
        (3.039498988, 0.75, -18.88797417),
        (19, 0.75, -18.88797417),
        (19, 0.75, 18.88797417),
        (3.039498988, 0.75, 18.88797417),
        (-1.25, 0.75, 24),
        (-19, 0.75, 18.25),
        (-13.25, 0.75, 24),
    ]]
    fillet(verrundung4_edges, radius=VERRUNDUNG4_R)

    # Verrundung5
    verrundung5_edges = [part.edges().sort_by_distance(p)[0] for p in [
        (-12.75, 3, -12.000947412),
        (-12.75, 3, 12.000947412),
    ]]
    fillet(verrundung5_edges, radius=VERRUNDUNG5_R)


solid = part.part
